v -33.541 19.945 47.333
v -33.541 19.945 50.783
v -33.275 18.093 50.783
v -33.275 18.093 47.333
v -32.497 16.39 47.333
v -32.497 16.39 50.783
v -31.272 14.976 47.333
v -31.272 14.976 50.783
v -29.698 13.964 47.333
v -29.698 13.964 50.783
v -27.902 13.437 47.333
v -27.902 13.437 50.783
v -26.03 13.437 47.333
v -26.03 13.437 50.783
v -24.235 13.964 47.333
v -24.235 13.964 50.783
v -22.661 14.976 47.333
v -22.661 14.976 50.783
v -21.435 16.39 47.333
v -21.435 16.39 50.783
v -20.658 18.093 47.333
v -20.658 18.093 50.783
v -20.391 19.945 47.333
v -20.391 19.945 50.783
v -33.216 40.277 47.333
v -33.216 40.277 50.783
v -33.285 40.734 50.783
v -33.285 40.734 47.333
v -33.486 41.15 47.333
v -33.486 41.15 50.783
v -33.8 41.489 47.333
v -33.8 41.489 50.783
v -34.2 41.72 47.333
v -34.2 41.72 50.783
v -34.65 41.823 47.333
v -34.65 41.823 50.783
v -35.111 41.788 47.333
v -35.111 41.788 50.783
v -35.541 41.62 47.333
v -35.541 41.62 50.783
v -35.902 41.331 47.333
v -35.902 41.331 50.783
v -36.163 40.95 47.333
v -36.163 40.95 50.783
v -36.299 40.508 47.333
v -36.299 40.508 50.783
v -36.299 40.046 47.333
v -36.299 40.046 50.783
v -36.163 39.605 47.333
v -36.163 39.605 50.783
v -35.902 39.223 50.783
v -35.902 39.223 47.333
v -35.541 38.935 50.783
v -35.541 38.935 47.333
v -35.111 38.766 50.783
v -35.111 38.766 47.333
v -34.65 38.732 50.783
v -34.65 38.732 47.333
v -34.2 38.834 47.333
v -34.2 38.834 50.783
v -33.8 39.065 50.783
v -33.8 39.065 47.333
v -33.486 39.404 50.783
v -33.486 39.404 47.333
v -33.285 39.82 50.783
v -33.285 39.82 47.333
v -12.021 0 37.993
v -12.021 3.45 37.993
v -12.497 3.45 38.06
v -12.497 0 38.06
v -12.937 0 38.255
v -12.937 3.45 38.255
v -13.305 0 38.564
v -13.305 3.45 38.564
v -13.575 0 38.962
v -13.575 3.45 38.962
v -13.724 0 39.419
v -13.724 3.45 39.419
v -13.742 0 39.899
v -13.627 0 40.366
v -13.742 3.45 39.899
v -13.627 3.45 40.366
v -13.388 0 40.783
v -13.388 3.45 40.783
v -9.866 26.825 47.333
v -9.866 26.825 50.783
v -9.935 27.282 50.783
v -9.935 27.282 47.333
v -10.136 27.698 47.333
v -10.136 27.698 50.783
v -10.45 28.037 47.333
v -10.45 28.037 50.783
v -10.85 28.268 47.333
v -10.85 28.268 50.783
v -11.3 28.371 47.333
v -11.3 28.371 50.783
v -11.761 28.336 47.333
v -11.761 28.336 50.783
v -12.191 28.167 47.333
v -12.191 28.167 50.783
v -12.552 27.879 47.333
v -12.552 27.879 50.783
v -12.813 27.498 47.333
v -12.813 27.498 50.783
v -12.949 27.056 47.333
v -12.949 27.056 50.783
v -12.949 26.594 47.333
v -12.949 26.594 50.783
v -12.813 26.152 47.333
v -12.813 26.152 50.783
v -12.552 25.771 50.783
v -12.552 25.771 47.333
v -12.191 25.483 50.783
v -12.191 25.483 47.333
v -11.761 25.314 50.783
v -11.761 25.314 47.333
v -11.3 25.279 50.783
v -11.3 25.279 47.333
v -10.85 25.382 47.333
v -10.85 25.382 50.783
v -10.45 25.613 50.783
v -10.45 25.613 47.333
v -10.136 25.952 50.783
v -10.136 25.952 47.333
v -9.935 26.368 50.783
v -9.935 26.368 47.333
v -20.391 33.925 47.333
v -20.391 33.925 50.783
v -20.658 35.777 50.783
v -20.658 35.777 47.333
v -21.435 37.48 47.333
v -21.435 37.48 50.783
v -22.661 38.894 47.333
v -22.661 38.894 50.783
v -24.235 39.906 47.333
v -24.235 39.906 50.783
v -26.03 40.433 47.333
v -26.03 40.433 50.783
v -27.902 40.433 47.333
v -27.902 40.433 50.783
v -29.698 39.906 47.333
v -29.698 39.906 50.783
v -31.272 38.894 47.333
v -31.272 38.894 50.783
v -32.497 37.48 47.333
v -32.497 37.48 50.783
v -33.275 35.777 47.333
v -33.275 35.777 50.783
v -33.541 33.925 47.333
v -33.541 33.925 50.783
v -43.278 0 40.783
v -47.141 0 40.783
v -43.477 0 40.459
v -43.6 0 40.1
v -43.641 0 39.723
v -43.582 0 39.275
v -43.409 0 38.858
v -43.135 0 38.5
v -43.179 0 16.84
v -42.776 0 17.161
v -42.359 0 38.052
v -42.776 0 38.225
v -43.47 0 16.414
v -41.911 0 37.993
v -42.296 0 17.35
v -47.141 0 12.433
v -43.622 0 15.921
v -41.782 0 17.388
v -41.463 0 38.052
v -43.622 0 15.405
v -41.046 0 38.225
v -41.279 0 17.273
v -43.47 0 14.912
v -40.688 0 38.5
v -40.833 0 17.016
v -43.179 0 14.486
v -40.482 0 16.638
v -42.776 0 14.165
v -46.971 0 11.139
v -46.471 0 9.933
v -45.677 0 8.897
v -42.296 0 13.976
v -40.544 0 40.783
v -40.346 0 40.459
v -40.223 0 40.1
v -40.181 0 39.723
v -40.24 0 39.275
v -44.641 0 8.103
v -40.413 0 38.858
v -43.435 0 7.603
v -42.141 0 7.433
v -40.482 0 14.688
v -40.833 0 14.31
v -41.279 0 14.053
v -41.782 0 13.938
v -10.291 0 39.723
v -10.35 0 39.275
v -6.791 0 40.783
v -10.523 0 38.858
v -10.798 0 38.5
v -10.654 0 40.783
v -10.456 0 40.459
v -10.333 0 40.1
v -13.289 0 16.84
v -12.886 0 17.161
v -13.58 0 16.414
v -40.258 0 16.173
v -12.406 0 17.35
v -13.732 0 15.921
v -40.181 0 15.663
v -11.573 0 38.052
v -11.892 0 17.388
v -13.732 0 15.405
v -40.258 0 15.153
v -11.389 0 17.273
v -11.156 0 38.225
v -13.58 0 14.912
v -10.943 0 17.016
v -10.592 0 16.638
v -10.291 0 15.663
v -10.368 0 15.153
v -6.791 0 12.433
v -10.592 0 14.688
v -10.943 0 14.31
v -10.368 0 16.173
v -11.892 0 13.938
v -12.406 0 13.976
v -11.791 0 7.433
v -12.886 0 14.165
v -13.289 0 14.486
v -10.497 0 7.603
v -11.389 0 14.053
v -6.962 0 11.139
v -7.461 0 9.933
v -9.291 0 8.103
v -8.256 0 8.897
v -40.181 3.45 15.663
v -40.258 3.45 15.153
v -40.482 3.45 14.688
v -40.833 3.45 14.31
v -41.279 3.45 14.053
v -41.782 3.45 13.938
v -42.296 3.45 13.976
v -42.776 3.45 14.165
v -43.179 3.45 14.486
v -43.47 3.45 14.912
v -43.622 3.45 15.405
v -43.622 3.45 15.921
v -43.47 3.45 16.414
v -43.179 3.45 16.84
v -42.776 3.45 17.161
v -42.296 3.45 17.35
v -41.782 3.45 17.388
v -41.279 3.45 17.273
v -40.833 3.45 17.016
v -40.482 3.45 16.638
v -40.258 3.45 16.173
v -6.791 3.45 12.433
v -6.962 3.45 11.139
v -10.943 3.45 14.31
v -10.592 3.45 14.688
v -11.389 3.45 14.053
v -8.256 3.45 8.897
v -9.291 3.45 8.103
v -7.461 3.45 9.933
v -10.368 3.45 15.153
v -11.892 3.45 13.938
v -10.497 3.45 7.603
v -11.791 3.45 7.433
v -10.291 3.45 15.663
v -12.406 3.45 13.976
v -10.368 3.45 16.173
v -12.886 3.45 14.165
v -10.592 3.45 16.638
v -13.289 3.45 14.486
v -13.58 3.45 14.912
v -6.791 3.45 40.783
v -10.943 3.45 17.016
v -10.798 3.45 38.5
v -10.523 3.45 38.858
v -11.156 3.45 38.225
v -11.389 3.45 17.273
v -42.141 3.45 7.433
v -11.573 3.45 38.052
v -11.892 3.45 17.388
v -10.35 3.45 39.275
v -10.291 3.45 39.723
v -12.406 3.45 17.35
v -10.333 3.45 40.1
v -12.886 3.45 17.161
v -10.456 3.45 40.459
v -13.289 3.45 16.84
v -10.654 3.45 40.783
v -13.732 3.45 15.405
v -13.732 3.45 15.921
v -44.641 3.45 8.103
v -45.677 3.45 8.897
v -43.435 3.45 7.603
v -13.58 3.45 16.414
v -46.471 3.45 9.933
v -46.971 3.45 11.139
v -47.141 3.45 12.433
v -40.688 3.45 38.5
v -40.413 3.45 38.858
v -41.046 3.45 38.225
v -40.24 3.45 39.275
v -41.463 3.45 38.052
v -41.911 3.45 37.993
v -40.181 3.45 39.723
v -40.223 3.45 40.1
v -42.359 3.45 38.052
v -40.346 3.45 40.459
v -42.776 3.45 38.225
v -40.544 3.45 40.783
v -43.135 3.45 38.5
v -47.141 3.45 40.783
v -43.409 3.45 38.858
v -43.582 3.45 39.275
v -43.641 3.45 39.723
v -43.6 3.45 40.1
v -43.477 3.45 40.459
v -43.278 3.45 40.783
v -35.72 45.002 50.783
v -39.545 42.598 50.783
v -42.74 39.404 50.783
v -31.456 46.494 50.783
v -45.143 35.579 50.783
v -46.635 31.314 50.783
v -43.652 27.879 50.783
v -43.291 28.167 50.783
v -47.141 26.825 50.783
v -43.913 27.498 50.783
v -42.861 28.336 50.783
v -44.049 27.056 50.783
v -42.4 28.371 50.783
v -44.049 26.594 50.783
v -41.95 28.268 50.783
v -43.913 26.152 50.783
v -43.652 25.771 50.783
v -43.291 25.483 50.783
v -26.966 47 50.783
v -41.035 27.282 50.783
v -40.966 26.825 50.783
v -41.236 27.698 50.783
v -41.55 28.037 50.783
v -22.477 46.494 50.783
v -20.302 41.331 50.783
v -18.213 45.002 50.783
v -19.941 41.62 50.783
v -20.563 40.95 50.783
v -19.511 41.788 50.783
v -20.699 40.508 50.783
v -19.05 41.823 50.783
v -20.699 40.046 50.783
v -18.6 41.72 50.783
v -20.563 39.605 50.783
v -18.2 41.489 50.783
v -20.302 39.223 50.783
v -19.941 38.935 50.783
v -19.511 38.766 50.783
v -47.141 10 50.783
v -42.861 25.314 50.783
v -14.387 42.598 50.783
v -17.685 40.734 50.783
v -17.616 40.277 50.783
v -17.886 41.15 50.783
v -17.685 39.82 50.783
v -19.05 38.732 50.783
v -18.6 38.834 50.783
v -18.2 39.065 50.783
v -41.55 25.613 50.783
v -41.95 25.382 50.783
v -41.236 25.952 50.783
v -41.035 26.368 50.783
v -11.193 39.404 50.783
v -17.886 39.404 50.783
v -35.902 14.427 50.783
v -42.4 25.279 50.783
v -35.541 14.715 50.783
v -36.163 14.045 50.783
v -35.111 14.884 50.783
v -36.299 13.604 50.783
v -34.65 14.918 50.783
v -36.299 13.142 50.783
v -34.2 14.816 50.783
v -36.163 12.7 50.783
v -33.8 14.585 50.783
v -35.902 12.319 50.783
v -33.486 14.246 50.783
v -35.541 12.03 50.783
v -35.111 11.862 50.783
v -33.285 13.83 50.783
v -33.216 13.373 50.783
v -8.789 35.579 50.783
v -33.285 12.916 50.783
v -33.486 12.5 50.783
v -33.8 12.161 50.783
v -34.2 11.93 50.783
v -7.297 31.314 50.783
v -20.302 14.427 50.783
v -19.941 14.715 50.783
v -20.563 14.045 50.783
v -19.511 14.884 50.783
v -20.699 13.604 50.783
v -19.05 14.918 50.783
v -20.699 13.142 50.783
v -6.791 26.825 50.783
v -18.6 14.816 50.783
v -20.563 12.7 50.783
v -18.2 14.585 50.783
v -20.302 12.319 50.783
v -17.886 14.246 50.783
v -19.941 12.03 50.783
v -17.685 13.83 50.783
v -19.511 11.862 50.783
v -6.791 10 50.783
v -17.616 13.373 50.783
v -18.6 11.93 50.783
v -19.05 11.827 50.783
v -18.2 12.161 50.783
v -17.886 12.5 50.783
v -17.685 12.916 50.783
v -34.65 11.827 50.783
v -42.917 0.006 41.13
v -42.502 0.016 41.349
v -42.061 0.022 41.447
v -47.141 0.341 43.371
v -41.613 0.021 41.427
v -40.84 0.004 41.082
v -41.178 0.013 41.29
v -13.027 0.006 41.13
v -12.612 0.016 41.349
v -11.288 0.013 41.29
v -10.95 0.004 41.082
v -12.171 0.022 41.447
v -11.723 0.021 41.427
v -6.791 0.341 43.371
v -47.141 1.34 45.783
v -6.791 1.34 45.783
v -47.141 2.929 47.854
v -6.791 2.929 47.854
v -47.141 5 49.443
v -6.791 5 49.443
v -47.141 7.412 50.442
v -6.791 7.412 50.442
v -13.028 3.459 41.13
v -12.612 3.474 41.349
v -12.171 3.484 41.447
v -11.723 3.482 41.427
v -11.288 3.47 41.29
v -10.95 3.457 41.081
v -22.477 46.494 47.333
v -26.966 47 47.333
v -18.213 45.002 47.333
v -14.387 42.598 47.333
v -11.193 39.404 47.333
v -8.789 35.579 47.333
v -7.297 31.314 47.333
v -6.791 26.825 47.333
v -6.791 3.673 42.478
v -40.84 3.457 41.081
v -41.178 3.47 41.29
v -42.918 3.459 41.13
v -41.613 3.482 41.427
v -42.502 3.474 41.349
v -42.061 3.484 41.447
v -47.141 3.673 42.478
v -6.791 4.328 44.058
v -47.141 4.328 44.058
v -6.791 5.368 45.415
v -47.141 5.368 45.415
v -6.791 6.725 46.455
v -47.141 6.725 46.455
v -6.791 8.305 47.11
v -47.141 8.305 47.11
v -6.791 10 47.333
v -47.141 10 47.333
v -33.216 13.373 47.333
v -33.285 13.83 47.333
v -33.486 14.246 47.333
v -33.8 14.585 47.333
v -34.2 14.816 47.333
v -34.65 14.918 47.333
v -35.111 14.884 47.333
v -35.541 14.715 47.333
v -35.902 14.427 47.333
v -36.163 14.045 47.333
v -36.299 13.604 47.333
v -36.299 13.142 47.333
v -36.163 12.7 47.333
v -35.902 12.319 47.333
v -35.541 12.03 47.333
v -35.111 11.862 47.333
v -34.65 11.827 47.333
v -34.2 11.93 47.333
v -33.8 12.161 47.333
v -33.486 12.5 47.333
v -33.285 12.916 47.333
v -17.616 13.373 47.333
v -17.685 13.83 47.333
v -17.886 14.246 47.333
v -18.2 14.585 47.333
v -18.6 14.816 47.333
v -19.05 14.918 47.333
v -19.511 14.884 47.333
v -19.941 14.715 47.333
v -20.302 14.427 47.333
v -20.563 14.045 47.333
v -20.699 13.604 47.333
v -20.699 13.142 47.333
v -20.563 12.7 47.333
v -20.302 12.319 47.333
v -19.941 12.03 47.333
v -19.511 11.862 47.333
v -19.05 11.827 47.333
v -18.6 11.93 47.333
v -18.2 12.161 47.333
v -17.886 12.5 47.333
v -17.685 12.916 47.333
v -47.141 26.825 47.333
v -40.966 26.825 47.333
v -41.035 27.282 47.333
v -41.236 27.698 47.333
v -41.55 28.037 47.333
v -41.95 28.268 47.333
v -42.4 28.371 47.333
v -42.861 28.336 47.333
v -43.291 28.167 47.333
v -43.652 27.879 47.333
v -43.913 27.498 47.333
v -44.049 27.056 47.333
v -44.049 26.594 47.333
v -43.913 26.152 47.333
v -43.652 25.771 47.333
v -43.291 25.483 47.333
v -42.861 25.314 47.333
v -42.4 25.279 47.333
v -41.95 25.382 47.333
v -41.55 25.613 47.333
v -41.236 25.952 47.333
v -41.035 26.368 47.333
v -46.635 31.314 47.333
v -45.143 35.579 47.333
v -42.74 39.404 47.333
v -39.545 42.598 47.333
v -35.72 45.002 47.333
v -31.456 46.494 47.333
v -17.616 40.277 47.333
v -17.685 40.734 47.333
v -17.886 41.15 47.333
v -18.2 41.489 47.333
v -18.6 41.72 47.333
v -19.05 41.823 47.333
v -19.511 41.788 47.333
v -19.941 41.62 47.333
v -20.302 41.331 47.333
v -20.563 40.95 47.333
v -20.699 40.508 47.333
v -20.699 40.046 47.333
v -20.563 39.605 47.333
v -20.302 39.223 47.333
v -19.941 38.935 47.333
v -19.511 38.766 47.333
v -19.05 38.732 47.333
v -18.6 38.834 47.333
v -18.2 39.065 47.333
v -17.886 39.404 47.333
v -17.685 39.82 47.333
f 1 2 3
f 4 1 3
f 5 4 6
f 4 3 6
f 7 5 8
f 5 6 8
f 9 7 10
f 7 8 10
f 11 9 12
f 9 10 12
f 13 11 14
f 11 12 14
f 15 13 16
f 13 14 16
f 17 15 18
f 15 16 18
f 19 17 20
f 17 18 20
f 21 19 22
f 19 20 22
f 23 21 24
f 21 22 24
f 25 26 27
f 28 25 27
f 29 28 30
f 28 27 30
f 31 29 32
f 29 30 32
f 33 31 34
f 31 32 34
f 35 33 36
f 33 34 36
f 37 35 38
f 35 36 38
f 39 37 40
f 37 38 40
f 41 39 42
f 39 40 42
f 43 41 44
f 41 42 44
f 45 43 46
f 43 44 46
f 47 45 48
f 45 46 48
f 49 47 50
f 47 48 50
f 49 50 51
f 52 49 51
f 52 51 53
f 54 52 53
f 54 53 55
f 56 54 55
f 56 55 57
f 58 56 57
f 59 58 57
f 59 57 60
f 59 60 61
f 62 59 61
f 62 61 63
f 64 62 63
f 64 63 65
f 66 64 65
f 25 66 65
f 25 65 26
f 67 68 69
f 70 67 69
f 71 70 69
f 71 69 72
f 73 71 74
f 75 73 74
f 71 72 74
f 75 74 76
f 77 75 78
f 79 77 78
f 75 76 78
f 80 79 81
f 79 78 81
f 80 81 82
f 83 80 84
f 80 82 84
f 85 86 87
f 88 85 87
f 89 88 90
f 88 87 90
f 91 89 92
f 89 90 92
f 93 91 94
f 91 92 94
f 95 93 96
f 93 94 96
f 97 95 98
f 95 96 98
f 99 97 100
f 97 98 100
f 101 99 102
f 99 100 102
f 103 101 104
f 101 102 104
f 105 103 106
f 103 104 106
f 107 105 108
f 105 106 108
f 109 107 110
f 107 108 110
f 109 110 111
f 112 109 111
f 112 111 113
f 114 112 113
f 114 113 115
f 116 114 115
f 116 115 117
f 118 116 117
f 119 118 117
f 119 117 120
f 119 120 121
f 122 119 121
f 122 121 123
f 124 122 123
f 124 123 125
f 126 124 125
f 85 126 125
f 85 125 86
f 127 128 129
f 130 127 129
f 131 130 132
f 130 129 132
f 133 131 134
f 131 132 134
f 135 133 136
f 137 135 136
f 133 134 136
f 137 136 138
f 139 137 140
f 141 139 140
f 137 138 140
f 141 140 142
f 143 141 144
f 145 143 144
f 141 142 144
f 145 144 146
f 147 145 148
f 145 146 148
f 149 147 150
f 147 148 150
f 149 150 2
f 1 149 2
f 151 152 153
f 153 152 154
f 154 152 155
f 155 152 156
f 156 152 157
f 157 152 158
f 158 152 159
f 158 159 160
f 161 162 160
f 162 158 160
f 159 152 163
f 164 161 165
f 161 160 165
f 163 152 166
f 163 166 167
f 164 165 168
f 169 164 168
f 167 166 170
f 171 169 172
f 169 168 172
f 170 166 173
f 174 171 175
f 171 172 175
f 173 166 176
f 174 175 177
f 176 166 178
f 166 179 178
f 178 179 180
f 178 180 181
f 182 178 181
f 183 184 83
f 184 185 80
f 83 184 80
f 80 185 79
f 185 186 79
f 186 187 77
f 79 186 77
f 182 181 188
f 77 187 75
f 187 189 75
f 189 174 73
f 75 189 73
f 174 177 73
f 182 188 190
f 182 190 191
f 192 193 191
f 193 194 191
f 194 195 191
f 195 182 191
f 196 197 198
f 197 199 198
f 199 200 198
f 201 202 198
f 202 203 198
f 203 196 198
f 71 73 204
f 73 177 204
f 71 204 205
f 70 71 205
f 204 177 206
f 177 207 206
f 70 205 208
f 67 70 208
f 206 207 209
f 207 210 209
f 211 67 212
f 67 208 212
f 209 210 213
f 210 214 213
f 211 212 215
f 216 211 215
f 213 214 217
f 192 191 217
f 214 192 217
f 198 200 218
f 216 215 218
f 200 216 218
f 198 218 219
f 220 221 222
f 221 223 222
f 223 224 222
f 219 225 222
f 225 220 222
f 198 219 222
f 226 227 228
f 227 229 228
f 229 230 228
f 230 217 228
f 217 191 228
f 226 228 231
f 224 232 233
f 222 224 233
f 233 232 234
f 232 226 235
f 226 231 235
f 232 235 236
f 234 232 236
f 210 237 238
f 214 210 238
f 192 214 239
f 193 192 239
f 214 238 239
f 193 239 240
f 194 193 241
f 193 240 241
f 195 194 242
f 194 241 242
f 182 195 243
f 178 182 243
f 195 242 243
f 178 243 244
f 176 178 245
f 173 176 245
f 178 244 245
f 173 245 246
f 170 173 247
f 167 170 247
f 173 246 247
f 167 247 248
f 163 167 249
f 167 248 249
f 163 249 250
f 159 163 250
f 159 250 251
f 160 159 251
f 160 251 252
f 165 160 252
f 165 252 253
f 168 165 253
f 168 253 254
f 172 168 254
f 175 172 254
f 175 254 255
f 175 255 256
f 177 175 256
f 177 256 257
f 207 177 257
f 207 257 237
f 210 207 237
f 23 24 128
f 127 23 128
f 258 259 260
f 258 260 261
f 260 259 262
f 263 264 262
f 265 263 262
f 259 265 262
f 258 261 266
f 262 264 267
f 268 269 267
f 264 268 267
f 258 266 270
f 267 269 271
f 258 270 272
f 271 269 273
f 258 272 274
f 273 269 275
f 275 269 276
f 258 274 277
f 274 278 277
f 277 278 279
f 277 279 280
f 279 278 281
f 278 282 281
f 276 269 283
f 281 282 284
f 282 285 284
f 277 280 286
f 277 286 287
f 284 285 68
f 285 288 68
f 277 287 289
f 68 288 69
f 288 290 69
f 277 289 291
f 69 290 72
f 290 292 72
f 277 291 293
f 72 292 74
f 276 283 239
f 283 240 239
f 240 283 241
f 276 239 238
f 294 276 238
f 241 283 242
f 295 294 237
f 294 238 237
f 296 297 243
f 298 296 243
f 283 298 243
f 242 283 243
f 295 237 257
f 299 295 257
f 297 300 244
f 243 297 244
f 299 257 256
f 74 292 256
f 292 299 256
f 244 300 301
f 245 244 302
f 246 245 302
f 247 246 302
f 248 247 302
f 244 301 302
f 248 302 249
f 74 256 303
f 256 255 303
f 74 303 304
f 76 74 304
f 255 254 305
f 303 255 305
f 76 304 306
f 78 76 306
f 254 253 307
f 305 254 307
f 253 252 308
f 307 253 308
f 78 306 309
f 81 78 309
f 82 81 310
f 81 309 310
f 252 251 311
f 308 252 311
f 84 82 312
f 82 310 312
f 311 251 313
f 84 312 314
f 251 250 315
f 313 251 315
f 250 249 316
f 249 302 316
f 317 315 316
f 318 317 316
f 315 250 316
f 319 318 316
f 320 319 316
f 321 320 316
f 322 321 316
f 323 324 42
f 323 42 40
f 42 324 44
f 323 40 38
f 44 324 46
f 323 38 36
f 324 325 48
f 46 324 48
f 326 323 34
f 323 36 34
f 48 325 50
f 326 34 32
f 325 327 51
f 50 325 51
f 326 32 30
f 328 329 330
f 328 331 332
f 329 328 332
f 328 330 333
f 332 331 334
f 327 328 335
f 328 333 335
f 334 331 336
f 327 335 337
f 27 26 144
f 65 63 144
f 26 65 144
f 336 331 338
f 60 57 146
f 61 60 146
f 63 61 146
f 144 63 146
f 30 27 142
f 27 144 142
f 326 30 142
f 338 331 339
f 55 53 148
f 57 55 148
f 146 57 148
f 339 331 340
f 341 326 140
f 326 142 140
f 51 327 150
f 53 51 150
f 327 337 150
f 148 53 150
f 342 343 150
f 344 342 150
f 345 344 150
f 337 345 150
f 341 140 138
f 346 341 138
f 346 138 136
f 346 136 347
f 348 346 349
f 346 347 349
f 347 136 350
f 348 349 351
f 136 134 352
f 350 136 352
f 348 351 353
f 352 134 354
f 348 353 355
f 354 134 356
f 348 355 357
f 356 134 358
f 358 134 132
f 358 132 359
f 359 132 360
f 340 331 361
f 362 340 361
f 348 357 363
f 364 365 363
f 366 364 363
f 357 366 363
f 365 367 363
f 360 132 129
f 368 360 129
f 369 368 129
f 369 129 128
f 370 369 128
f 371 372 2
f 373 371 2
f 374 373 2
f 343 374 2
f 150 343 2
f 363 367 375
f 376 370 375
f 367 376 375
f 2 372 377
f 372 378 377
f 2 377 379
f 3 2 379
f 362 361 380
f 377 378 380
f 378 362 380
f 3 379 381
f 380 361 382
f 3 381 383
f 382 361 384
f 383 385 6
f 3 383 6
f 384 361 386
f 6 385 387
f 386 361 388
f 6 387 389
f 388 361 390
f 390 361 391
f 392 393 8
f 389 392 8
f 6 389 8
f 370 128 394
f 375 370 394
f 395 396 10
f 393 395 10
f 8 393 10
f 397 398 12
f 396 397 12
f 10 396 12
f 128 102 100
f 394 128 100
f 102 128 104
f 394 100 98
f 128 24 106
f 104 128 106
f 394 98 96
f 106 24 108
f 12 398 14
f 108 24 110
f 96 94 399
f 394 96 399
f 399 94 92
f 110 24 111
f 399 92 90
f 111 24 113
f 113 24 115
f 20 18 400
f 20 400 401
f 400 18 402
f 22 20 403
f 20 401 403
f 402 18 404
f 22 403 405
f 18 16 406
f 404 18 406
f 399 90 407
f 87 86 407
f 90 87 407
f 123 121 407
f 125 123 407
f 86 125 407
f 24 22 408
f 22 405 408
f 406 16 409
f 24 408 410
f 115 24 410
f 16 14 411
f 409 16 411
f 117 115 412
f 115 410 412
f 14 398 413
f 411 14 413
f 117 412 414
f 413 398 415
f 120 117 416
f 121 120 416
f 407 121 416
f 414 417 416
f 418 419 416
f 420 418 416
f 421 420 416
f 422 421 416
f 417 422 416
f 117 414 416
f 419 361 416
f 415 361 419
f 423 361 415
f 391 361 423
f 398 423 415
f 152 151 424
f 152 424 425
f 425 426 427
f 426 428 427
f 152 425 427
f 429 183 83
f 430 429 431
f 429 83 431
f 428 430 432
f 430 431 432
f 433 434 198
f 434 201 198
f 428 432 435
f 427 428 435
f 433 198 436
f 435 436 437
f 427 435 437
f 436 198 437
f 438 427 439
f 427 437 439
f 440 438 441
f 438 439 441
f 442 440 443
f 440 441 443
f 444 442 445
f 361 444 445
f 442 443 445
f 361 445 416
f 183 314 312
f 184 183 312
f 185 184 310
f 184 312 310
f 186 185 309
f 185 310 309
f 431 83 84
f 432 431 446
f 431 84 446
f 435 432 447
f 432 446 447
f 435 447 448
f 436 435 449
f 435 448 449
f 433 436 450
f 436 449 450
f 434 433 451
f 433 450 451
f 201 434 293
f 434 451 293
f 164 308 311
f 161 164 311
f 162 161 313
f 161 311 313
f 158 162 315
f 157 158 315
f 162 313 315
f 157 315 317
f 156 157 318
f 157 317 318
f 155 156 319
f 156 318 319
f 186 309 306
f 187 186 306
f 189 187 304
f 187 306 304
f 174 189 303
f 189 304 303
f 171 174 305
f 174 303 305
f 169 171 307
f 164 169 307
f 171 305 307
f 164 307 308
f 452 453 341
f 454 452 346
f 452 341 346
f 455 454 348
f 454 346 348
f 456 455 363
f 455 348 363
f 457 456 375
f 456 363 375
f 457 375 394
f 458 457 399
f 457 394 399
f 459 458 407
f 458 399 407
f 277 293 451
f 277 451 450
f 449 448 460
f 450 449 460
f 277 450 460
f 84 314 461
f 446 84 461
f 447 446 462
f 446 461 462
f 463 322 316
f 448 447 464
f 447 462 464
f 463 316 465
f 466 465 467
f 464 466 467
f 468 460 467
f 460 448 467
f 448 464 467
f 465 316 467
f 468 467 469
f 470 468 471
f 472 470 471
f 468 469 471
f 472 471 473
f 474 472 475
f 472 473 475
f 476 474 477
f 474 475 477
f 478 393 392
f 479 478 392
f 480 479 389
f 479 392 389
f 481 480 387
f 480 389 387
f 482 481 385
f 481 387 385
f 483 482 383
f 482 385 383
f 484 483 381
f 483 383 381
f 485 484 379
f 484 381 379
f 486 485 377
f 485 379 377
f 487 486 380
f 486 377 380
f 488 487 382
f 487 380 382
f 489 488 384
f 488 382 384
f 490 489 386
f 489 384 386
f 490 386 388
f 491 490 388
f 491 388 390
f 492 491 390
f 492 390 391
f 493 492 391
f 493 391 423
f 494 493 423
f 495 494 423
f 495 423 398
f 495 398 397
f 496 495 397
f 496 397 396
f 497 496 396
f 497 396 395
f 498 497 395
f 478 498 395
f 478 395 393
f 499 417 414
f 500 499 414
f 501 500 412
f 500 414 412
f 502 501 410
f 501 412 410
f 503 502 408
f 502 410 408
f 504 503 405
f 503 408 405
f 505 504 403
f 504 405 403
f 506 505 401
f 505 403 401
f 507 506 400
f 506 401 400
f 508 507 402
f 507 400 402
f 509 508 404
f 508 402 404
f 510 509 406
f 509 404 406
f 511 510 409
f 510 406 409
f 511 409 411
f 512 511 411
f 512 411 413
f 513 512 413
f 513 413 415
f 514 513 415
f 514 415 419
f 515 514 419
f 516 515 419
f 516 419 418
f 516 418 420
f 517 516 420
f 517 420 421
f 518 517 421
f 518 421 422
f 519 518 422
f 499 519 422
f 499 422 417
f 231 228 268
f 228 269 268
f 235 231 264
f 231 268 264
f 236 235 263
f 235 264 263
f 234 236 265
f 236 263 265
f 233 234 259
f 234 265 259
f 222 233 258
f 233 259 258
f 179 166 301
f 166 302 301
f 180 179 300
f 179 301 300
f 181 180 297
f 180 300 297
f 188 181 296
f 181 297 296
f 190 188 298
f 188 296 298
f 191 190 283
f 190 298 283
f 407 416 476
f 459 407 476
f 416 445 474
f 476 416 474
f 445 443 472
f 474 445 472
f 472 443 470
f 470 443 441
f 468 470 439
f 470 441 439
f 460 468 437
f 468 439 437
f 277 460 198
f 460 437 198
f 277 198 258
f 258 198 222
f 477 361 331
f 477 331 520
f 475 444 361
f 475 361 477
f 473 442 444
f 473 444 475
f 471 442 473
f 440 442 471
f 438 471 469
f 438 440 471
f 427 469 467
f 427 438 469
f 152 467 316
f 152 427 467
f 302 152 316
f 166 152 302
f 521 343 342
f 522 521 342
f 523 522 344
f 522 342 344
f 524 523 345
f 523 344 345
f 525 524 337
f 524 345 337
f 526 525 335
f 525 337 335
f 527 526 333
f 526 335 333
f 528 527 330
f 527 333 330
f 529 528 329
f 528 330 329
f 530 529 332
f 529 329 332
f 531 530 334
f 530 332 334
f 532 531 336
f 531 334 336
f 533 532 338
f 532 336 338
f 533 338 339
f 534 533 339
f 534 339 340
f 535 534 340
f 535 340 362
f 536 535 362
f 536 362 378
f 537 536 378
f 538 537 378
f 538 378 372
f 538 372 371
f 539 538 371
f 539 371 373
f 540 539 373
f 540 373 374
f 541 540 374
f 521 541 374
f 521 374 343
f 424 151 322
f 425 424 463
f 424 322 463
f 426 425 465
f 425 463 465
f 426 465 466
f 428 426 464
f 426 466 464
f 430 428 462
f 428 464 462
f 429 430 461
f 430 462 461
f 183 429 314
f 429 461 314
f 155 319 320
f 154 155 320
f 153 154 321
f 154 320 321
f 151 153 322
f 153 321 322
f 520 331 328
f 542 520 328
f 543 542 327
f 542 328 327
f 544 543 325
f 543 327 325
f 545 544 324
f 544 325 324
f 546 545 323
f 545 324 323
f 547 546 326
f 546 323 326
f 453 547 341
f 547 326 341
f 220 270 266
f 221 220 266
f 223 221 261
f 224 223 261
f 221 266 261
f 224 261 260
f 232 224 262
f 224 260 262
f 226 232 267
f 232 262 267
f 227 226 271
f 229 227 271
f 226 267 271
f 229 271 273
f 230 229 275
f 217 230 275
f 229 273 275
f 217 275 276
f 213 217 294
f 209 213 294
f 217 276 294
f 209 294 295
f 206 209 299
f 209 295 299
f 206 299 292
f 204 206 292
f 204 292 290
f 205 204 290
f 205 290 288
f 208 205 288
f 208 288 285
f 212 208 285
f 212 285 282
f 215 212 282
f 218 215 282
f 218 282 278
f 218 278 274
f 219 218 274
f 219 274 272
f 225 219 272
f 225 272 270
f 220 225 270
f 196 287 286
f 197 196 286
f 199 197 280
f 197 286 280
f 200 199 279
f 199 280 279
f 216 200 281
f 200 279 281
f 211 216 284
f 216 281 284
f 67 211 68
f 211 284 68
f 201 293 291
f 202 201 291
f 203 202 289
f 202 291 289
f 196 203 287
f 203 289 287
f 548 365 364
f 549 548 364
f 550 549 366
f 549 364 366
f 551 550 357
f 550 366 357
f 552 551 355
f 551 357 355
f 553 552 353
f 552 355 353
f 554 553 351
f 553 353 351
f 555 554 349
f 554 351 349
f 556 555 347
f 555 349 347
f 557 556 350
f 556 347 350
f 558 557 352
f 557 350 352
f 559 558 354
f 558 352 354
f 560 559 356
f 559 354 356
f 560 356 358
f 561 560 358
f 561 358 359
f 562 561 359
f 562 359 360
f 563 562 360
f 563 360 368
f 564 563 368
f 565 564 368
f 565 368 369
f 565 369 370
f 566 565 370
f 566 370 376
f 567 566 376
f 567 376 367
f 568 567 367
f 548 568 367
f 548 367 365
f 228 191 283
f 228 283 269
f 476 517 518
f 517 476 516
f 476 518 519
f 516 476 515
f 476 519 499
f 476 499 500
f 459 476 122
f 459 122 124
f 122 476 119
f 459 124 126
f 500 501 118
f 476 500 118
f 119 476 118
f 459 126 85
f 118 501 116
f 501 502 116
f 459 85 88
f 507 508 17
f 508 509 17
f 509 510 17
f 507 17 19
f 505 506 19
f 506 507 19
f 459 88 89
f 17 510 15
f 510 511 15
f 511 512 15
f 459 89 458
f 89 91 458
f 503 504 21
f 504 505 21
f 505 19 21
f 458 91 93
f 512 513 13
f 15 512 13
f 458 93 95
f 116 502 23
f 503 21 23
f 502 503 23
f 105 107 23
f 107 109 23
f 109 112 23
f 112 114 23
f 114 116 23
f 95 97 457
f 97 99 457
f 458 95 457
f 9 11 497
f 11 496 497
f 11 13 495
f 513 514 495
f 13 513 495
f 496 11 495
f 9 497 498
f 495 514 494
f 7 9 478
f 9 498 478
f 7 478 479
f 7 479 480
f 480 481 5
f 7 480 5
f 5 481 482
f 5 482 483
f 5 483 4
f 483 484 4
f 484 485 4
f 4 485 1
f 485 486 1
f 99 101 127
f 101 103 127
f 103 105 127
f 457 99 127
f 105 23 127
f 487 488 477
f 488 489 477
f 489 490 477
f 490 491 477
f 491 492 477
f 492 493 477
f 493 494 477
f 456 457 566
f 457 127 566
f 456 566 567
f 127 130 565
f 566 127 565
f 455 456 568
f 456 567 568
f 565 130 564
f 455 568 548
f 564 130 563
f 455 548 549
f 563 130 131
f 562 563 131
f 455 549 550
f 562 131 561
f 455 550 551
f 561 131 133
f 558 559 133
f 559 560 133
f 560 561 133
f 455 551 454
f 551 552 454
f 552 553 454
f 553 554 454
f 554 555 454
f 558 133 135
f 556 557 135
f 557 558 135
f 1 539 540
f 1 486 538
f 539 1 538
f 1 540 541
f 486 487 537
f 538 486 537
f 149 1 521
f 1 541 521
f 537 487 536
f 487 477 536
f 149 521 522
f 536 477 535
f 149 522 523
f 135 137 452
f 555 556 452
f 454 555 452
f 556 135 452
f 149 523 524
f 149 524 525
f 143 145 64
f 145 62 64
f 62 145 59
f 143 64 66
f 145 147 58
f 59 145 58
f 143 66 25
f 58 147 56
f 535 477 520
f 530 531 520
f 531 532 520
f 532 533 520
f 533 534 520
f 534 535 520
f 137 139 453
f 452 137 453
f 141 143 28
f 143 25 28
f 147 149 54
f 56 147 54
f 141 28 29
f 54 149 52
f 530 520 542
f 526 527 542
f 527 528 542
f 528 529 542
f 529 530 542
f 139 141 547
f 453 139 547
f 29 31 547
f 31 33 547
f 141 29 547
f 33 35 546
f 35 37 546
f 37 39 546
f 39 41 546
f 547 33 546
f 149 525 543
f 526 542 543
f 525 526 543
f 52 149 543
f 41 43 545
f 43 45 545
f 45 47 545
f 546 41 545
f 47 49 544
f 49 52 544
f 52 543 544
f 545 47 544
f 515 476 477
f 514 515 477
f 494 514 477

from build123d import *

# Parameters (mm, degrees)
SKETCH1_W               = 40.35
SKETCH1_H               = 43.35
BOSS_EXTRUDE1_DEPTH     = 47
CUT_EXTRUDE2_DEPTH      = 102
FILLET1_R               = 10
CUT_EXTRUDE3_DEPTH      = 102
FILLET2_R               = 5
CUT_EXTRUDE4_DEPTH      = 102
CUT_EXTRUDE4_DEPTH_BACK = 102
SKETCH6_R               = 1.73
CUT_EXTRUDE5_DEPTH      = 102
SKETCH8_R               = 1.55
CUT_EXTRUDE6_DEPTH      = 102


with BuildPart() as part:
    # Sketch1 → Boss-Extrude1 (new body)
    with BuildSketch(Plane(origin=(0, 0, 0), x_dir=(1, 0, 0), z_dir=(0, 1, 0))):
        with Locations((-26.966212793, -29.108023223)):
            Rectangle(SKETCH1_W, SKETCH1_H)
    extrude(amount=BOSS_EXTRUDE1_DEPTH)

    # Sketch3 → Cut-Extrude2 (cut)
    with BuildSketch(Plane.XY.offset(50.783023223)):
        with BuildLine():
            Line((-6.791212793, 47), (-26.966212793, 47))
            ThreePointArc((-26.966212793, 47), (-12.700333482, 41.09087931), (-6.791212793, 26.825))
            Line((-6.791212793, 26.825), (-6.791212793, 47))
        make_face()
        with BuildLine():
            Line((-47.141212793, 47), (-47.141212793, 26.825))
            ThreePointArc((-47.141212793, 26.825), (-41.232092103, 41.09087931), (-26.966212793, 47))
            Line((-26.966212793, 47), (-47.141212793, 47))
        make_face()
    extrude(amount=-CUT_EXTRUDE2_DEPTH, mode=Mode.SUBTRACT)

    # Fillet1
    fillet1_edges = [part.edges().sort_by_distance(p)[0] for p in [
        (-26.966212793, 0, 50.783023223),
    ]]
    fillet(fillet1_edges, radius=FILLET1_R)

    # Sketch5 → Cut-Extrude3 (cut)
    with BuildSketch(Plane.ZY.offset(47.141212793)):
        with BuildLine():
            Line((47.333023223, 59.778436909), (-6.665763497, 59.778436909))
            Line((-6.665763497, 59.778436909), (-6.665763497, 3.45))
            Line((-6.665763497, 3.45), (40.783023223, 3.45))
            ThreePointArc((40.783023223, 3.45), (45.41457264, 5.368450583), (47.333023223, 10))
            Line((47.333023223, 10), (47.333023223, 59.778436909))
        make_face()
    extrude(amount=-CUT_EXTRUDE3_DEPTH, mode=Mode.SUBTRACT)

    # Fillet2
    fillet2_edges = [part.edges().sort_by_distance(p)[0] for p in [
        (-6.791212793, 1.725, 7.433023223),
        (-47.141212793, 1.725, 7.433023223),
    ]]
    fillet(fillet2_edges, radius=FILLET2_R)

    # Sketch6 → Cut-Extrude4 (cut, two sides: drawn at the far end of the back side and taken through both)
    with BuildSketch(Plane(origin=(0, 3.45, 0), x_dir=(1, 0, 0), z_dir=(0, 1, 0)).offset(-CUT_EXTRUDE4_DEPTH_BACK)):
        with Locations((-41.911212793, -15.663023223)):
            Circle(SKETCH6_R)
        with Locations((-41.911212793, -39.723023223)):
            Circle(SKETCH6_R)
        with Locations((-12.021212793, -15.663023223)):
            Circle(SKETCH6_R)
        with Locations((-12.021212793, -39.723023223)):
            Circle(SKETCH6_R)
    extrude(amount=CUT_EXTRUDE4_DEPTH + CUT_EXTRUDE4_DEPTH_BACK, mode=Mode.SUBTRACT)

    # Sketch7 → Cut-Extrude5 (cut)
    with BuildSketch(Plane.XY.offset(50.783023223)):
        with BuildLine():
            ThreePointArc((-26.966212793, 40.5), (-31.615439879, 38.574227086), (-33.541212793, 33.925))
            Line((-33.541212793, 33.925), (-33.541212793, 21.982917389))
            Line((-33.541212793, 21.982917389), (-33.541212793, 19.945))
            ThreePointArc((-33.541212793, 19.945), (-26.966212793, 13.37), (-20.391212793, 19.945))
            Line((-20.391212793, 19.945), (-20.391212793, 20.41689663))
            Line((-20.391212793, 20.41689663), (-20.391212793, 33.925))
            ThreePointArc((-20.391212793, 33.925), (-22.316985706, 38.574227086), (-26.966212793, 40.5))
        make_face()
    extrude(amount=-CUT_EXTRUDE5_DEPTH, mode=Mode.SUBTRACT)

    # Sketch8 → Cut-Extrude6 (cut)
    with BuildSketch(Plane.XY.offset(50.783023223)):
        with Locations((-42.516212793, 26.825)):
            Circle(SKETCH8_R)
        with Locations((-34.766212793, 40.277230298)):
            Circle(SKETCH8_R)
        with Locations((-34.766212793, 13.372769702)):
            Circle(SKETCH8_R)
        with Locations((-19.166212793, 13.372769702)):
            Circle(SKETCH8_R)
        with Locations((-11.416212793, 26.825)):
            Circle(SKETCH8_R)
        with Locations((-19.166212793, 40.277230298)):
            Circle(SKETCH8_R)
    extrude(amount=-CUT_EXTRUDE6_DEPTH, mode=Mode.SUBTRACT)


solid = part.part
